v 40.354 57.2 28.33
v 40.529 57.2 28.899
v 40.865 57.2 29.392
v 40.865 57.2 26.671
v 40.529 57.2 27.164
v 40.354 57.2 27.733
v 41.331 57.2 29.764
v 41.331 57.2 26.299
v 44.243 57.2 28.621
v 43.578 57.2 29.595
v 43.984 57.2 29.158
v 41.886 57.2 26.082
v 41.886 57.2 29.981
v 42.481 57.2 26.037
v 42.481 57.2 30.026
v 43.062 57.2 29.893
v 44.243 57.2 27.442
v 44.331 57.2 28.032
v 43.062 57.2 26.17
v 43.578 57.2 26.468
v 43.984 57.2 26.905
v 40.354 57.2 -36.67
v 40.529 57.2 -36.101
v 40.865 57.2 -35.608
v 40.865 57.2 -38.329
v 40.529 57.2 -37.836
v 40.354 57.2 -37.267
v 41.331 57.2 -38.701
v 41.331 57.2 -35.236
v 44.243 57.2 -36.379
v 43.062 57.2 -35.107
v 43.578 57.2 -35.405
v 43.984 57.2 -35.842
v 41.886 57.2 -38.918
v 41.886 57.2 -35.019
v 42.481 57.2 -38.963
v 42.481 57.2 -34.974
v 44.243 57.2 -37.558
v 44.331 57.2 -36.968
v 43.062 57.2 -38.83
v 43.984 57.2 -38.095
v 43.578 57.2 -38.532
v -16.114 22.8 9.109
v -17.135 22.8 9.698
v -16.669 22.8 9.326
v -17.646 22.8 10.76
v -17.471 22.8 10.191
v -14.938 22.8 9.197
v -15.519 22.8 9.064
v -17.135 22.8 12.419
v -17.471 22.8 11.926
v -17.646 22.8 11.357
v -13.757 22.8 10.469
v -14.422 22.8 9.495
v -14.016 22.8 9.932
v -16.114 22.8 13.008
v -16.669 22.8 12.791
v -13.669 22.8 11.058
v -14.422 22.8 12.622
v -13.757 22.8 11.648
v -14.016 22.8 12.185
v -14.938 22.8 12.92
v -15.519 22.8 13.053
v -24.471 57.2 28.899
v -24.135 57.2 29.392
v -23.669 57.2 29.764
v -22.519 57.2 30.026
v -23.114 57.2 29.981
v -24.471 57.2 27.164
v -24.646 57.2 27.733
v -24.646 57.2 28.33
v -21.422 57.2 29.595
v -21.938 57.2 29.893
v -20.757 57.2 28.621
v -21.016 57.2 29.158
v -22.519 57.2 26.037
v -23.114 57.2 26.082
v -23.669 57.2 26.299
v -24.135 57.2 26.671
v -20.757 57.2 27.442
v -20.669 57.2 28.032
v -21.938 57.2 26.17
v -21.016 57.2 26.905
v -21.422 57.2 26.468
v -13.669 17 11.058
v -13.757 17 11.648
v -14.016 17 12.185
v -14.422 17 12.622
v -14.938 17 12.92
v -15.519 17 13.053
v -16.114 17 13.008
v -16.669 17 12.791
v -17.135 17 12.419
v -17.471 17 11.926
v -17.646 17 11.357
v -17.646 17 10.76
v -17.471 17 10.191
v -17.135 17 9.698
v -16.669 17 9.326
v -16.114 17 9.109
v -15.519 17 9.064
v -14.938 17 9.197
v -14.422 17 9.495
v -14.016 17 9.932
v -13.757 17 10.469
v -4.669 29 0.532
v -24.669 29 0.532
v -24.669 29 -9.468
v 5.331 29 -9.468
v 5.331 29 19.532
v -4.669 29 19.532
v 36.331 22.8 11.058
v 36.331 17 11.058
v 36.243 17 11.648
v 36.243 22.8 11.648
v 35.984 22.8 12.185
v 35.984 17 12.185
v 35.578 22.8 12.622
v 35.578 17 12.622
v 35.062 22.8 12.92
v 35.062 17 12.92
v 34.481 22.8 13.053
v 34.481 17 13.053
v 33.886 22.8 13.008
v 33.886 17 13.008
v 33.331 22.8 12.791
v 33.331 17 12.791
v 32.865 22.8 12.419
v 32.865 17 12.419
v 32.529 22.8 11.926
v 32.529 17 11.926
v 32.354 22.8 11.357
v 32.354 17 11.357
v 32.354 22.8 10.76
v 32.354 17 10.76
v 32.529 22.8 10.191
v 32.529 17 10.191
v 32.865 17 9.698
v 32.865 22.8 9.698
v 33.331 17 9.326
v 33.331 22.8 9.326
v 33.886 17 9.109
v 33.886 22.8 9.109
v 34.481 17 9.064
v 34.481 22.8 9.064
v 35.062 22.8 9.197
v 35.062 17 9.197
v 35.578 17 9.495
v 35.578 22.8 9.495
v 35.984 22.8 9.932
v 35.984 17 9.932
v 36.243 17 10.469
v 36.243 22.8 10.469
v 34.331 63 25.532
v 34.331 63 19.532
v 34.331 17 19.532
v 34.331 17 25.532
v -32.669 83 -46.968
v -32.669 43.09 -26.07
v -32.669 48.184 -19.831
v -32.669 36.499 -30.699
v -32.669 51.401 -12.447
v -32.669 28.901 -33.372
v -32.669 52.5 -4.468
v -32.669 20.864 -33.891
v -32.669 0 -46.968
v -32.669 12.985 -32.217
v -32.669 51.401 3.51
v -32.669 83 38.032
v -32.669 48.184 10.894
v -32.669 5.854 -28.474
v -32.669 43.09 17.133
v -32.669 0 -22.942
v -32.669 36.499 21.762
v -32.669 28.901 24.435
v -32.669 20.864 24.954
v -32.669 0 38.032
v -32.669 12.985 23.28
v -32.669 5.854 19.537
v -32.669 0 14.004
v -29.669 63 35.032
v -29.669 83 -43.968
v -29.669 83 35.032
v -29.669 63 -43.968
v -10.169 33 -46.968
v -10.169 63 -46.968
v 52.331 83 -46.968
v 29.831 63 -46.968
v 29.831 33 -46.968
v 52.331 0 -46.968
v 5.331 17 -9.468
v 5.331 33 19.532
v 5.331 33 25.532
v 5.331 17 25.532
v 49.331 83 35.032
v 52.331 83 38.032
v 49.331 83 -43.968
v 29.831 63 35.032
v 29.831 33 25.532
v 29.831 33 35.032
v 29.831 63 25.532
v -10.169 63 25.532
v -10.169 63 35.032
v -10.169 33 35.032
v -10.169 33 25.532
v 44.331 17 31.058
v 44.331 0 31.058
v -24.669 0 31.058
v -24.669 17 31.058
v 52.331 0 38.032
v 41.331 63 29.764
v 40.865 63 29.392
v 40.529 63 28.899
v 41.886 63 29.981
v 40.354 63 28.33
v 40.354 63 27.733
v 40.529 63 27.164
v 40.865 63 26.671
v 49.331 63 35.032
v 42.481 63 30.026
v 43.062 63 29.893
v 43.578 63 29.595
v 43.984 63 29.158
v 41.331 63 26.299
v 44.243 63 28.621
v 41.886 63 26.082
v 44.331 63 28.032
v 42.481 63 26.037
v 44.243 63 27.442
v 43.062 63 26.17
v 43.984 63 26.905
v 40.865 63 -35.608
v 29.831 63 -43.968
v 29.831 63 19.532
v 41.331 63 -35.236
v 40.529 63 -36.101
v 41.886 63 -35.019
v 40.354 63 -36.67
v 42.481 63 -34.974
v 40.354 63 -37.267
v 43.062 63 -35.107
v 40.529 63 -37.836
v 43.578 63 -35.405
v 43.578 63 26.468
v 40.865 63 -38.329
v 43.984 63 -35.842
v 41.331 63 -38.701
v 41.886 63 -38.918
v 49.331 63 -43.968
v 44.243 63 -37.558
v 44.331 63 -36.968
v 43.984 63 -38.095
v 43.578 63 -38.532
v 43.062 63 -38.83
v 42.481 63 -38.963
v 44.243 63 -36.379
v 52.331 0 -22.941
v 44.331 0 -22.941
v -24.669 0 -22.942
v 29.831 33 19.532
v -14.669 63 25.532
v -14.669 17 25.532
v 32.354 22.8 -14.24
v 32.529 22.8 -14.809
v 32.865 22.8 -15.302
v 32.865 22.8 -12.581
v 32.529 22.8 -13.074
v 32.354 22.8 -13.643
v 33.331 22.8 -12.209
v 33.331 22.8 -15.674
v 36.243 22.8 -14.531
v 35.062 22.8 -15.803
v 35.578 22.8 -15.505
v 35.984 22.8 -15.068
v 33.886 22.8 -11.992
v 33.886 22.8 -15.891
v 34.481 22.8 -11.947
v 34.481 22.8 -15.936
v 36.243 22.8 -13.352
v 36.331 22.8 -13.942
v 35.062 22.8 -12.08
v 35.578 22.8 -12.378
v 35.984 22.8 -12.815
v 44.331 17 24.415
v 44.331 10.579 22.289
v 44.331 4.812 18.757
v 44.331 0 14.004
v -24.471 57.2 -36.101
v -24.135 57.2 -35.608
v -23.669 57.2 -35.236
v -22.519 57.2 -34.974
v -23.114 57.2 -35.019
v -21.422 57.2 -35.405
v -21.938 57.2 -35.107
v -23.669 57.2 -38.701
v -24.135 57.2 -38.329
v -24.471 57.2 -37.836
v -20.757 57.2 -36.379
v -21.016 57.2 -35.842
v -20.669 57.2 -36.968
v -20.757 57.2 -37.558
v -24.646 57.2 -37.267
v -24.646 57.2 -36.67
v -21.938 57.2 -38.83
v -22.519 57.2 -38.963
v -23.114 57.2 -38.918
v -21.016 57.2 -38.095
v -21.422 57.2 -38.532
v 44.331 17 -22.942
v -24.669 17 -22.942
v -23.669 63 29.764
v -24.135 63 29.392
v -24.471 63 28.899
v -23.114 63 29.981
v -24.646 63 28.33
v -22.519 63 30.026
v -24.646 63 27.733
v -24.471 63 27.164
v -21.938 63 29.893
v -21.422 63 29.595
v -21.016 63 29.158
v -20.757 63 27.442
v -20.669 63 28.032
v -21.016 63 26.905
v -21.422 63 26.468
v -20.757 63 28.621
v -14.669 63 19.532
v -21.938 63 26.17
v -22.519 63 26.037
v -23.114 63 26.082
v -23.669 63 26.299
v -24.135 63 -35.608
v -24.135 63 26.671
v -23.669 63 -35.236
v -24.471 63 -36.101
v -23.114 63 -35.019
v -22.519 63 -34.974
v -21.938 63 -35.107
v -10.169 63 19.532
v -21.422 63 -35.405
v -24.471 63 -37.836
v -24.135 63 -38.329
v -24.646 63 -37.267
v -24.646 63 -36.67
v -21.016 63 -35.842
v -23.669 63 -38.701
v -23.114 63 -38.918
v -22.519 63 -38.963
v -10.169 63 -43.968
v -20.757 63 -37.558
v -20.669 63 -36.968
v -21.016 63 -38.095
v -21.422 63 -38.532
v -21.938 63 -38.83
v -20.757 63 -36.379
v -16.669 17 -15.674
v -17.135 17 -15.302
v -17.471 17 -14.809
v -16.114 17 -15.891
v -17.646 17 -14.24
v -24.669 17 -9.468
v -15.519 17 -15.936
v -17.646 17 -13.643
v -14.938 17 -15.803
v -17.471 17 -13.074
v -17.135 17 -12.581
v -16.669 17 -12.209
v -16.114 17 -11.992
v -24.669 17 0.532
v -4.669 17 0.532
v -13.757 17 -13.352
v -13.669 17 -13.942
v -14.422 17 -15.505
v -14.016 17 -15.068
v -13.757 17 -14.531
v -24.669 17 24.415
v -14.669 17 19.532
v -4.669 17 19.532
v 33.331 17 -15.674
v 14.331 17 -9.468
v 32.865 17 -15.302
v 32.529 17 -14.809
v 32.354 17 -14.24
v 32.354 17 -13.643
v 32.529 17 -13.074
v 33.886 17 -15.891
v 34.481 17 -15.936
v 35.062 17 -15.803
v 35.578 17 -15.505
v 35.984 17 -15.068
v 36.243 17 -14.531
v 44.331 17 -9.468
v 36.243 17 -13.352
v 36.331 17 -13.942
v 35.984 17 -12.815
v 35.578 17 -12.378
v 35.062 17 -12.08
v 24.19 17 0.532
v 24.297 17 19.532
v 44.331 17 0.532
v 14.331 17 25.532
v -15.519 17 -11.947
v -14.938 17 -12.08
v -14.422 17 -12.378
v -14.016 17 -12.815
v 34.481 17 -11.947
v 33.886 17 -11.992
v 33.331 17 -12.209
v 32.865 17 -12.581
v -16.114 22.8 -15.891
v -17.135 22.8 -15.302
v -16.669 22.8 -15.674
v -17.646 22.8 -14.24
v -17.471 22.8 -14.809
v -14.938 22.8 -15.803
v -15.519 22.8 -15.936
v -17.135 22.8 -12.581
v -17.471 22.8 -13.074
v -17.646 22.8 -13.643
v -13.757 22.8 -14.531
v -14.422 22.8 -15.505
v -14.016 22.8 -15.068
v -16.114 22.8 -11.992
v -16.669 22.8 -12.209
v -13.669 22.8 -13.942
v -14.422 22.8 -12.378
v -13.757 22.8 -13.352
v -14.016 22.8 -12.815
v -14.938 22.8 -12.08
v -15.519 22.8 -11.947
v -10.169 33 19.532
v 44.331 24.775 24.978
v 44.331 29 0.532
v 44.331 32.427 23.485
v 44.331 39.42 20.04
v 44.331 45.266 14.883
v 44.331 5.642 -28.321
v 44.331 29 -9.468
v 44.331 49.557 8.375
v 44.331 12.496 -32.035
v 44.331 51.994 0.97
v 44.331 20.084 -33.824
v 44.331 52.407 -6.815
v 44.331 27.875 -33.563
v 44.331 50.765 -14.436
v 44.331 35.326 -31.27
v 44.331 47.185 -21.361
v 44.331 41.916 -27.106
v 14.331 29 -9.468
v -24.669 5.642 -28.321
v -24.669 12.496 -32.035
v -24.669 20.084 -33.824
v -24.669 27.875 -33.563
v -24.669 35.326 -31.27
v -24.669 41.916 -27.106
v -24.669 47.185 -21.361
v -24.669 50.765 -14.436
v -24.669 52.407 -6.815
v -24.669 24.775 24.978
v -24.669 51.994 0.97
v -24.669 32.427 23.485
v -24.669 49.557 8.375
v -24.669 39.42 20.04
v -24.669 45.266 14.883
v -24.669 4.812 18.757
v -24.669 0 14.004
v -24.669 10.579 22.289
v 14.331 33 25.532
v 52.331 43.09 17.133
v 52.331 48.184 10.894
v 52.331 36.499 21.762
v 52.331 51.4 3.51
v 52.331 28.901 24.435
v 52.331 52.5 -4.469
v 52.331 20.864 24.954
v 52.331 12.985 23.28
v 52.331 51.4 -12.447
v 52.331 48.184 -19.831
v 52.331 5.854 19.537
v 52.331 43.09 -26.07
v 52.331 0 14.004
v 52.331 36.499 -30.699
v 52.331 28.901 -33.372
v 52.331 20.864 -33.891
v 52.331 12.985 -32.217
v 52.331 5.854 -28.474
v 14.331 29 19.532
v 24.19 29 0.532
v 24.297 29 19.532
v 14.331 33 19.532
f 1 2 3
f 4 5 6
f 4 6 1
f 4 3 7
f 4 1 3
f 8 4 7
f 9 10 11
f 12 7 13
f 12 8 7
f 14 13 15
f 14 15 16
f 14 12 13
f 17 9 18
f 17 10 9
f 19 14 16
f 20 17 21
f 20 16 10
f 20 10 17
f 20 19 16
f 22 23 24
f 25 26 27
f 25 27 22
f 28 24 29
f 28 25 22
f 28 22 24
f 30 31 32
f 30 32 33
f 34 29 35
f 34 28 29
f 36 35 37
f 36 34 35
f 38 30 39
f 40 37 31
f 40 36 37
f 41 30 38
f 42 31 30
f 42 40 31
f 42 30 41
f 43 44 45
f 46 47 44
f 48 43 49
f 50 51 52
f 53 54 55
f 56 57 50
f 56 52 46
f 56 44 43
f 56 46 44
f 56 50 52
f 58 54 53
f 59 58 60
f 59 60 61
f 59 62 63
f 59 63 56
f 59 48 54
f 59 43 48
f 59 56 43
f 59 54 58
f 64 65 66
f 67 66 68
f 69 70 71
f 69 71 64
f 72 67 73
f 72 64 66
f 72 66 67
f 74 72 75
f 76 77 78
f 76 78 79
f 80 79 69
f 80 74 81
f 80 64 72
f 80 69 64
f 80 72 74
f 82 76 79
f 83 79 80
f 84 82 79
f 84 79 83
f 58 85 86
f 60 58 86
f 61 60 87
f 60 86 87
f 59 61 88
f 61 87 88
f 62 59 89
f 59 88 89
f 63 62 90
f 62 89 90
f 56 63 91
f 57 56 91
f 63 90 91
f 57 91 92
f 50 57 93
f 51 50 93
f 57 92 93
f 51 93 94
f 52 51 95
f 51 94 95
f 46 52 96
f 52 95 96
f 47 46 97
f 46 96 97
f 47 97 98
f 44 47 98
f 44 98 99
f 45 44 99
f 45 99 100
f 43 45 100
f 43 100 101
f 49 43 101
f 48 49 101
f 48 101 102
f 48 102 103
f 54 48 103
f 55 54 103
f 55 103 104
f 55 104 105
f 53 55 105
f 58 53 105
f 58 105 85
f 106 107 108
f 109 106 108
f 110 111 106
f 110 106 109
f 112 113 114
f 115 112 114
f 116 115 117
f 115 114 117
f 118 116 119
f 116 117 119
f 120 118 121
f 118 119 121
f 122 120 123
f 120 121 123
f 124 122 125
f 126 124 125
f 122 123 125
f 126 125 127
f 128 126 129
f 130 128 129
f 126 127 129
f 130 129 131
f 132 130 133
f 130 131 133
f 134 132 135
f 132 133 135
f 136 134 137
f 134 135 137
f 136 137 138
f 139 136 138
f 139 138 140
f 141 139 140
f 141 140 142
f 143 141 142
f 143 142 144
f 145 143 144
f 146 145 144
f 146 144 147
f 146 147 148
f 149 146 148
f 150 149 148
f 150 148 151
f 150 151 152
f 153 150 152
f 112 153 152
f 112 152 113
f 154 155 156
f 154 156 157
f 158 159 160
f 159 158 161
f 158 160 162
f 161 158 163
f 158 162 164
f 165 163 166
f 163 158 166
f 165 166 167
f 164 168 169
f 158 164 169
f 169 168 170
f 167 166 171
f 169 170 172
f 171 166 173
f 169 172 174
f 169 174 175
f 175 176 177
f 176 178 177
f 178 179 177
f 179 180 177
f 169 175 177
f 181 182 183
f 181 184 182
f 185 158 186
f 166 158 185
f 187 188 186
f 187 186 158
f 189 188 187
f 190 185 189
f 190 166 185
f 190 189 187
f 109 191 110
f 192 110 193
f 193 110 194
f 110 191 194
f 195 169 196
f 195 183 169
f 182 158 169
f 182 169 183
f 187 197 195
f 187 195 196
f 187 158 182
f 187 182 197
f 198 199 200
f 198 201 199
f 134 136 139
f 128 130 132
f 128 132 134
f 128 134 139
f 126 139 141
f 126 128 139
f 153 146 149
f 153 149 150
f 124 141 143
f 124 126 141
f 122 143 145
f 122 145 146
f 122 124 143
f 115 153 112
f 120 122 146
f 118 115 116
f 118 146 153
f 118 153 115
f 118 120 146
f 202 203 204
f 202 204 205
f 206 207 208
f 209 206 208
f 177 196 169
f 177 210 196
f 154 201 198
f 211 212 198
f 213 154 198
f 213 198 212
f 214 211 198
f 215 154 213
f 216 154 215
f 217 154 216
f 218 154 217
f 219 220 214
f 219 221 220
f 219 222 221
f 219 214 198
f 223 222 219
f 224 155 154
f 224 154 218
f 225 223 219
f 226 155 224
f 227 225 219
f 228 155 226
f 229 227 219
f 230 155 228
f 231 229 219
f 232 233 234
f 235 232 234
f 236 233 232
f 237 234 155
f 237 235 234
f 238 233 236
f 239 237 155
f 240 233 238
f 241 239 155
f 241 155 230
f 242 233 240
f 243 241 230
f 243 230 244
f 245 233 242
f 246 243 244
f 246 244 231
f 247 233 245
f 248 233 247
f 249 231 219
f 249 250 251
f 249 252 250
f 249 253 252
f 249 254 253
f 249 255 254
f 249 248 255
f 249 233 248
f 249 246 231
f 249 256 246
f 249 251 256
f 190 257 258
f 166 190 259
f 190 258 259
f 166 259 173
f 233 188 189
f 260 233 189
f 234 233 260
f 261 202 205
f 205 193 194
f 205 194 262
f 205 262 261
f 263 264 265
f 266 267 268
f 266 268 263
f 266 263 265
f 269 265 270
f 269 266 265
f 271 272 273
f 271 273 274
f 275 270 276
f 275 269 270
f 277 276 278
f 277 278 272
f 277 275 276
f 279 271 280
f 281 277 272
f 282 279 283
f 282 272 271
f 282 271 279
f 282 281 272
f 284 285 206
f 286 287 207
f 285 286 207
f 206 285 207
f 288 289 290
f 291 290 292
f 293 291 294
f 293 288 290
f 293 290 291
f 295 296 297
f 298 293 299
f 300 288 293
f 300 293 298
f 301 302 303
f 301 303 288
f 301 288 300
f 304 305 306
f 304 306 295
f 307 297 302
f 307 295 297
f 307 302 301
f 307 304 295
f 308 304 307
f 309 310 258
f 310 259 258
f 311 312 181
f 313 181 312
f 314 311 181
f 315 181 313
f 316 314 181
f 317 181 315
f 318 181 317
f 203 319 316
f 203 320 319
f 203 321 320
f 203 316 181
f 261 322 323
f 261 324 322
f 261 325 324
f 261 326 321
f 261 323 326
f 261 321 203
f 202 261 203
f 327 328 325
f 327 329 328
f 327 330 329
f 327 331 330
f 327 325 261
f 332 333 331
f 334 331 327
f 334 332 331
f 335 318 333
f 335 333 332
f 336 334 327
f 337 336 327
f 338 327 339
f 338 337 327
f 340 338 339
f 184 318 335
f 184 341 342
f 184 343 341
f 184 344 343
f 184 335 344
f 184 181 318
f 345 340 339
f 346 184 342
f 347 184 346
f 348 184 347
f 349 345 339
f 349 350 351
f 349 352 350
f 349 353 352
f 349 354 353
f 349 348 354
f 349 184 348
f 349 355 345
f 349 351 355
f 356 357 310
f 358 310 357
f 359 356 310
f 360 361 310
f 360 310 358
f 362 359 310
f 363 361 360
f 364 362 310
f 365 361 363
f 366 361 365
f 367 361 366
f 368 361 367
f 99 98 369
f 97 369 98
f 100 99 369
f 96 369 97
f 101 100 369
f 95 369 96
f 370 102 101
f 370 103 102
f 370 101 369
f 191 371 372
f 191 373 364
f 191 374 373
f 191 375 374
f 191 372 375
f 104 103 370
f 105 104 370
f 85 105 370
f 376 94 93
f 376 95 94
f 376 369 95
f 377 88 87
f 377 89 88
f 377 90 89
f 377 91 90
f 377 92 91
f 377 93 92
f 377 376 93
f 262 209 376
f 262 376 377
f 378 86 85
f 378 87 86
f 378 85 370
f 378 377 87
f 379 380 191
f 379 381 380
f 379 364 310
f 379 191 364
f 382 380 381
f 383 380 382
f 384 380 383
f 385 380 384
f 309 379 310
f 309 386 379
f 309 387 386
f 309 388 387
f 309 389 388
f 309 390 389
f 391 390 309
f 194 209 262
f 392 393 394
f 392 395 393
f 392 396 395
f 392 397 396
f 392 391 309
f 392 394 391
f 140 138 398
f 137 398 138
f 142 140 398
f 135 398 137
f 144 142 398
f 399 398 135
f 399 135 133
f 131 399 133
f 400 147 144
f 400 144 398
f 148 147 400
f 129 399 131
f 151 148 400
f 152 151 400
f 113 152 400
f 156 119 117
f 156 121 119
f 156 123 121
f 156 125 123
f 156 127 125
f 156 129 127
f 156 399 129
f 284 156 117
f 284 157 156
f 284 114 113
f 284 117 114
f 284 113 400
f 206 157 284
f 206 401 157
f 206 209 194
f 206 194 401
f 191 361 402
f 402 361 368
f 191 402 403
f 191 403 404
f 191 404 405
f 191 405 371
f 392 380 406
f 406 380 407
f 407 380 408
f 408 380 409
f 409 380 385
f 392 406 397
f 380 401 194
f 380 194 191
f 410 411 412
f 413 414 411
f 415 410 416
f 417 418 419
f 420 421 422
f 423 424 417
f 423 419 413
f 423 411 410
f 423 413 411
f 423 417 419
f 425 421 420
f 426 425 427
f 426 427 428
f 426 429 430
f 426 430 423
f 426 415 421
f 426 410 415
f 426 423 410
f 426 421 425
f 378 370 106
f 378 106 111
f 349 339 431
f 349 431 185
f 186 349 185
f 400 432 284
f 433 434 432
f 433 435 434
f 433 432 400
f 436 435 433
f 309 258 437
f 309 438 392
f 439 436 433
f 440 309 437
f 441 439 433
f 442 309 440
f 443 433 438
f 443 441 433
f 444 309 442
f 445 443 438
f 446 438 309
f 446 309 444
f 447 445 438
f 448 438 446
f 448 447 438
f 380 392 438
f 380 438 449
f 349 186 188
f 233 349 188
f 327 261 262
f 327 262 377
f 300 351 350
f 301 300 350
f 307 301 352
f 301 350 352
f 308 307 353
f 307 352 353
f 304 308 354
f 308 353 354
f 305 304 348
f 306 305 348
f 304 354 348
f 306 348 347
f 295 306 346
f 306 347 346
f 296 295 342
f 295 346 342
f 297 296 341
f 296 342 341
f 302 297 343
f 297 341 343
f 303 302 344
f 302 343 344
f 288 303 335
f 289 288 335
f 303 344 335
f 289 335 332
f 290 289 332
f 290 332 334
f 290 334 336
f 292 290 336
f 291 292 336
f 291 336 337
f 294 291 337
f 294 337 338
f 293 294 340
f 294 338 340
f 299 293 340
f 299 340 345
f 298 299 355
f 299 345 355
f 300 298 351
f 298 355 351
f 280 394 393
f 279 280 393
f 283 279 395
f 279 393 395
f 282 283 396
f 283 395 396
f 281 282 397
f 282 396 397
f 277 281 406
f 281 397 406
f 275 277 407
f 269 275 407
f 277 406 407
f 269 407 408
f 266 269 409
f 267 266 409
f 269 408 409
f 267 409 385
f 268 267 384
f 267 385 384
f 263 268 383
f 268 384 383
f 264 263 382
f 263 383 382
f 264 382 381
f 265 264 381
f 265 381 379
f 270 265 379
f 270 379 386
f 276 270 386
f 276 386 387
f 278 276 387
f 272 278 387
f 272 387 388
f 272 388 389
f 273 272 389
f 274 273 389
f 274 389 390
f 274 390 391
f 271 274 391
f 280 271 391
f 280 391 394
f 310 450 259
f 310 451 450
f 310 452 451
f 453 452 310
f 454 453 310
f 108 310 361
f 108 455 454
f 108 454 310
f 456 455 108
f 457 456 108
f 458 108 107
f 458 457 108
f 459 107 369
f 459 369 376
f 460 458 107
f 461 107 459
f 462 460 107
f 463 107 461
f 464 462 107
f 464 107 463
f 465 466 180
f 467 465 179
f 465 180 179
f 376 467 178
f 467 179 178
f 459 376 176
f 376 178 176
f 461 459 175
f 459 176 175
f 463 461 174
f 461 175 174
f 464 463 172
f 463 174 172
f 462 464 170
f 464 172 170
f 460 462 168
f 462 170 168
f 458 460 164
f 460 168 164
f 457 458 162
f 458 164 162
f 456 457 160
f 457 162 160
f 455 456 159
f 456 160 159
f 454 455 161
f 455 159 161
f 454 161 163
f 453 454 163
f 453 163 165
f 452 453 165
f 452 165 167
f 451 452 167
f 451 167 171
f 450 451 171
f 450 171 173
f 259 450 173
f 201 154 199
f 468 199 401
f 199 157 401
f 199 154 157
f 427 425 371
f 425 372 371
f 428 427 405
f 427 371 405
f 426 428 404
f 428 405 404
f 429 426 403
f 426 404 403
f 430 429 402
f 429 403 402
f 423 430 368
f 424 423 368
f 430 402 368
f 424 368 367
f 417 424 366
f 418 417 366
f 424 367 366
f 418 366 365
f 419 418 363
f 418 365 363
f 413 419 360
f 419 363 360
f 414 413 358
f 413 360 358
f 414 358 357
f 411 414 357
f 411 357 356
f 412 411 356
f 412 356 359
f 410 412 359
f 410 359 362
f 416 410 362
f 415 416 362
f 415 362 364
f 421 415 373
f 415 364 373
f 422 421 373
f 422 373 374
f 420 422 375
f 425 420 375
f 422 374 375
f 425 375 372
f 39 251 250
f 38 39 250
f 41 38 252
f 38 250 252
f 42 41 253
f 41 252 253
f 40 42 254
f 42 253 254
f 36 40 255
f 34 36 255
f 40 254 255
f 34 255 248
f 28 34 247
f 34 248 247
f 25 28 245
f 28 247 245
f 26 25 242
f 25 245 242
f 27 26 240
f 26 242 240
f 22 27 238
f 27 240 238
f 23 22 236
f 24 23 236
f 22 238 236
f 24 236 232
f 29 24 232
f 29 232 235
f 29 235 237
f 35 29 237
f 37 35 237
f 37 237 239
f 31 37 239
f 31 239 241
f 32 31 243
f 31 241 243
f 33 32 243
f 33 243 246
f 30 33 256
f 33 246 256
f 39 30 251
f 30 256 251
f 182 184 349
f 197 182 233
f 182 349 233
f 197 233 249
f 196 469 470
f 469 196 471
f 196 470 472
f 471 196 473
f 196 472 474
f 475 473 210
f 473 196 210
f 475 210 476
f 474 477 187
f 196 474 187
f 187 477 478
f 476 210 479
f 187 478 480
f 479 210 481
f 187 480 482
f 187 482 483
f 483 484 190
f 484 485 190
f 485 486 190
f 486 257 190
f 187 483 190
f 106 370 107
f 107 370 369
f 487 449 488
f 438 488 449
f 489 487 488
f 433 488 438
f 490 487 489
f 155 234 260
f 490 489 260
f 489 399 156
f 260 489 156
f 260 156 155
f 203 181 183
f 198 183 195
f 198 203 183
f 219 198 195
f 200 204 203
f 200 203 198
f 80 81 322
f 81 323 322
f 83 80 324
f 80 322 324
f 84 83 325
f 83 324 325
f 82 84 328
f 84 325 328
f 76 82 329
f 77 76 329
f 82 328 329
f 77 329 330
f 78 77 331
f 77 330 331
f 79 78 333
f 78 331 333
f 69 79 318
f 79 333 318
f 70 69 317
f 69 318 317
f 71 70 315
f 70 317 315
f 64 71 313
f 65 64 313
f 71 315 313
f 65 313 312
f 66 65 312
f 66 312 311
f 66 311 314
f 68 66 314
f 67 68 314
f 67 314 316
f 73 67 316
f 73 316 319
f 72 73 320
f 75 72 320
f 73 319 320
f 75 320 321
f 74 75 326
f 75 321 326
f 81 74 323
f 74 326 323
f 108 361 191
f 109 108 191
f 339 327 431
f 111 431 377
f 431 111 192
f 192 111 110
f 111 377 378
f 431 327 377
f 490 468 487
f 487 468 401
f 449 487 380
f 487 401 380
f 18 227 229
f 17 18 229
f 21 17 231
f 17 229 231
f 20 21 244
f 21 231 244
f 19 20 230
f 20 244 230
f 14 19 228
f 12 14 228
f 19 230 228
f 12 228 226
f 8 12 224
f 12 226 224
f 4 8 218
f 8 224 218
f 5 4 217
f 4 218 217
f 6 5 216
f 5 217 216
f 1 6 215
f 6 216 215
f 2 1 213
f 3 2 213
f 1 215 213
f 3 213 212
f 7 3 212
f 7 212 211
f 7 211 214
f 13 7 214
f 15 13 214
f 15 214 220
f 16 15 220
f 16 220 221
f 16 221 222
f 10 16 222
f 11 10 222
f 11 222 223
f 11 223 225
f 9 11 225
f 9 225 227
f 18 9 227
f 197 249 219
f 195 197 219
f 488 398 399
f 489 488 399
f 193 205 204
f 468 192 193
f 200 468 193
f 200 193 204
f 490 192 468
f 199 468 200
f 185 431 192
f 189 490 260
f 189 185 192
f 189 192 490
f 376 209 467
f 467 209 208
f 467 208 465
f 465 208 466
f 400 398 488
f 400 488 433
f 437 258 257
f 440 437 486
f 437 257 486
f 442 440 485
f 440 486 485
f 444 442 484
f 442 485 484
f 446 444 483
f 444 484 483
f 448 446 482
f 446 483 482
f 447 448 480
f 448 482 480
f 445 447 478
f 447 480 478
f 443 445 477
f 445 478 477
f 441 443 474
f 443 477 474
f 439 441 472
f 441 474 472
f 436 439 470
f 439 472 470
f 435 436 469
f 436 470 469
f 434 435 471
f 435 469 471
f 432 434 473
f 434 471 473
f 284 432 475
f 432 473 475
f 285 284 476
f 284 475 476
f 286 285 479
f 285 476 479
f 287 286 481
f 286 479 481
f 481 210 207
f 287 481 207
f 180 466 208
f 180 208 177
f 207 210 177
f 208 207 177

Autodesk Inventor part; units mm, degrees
ref_plane "YZ Plane" through (0, 0, 0) normal (1, 0, 0) x (0, 1, 0)
ref_plane "XZ Plane" through (0, 0, 0) normal (0, 1, 0) x (-1, 0, 0)
ref_plane "XY Plane" through (0, 0, 0) normal (0, 0, 1) x (1, 0, 0)
sketch "Sketch1" plane through (0, 0, 0) normal (0, 1, 0) x (-1, 0, 0)
  line L0 (32.6686, 38.0315) -> (-52.3314, 38.0315)
  line L1 (-52.3314, 38.0315) -> (-52.3314, -46.9685)
  line L2 (-52.3314, -46.9685) -> (32.6686, -46.9685)
  line L3 (32.6686, -46.9685) -> (32.6686, 38.0315)
  point P0 (0, 0)
  dimension "d0" = 85
  dimension "d1" = 85
extrude "Extrusion1" add sketch "Sketch1" along normal blind 73
sketch "Sketch2" plane through (52.3314, 0, 38.0315) normal (1, 0, 0) x (0, 0, -1)
  point P0 (38.0315, 0)
sketch "Sketch3" plane through (52.3314, 0, 38.0315) normal (1, 0, 0) x (0, 0, -1)
  circle A0 centre (42.5, 23) radius 29.5
  line L0 (0, 73) -> (85, 73) projected
  line L1 (85, 0) -> (85, 73) projected
  point P0 (38.0315, 0)
  dimension "d4" = 59
  dimension "d5" = 50
  dimension "d6" = 42.5
extrude "Extrusion2" cut sketch "Sketch3" against normal blind 8
sketch "Sketch4" plane through (-32.6686, 0, -46.9685) normal (-1, 0, 0) x (0, 0, 1)
  arc A0 (60.973, 0) -> (24.027, 0) centre (42.5, 23) ccw projected
  circle A1 centre (42.5, 23) radius 29.5
  point P0 (46.9685, 0)
  point P1 (24.027, 0)
extrude "Extrusion3" cut sketch "Sketch4" against normal blind 8
sketch "Sketch5" plane through (0, 0, 0) normal (0, -1, 0) x (1, 0, 0)
  line L0 (-24.6686, 14.0044) -> (-24.6686, -22.9415) projected
  line L1 (-24.6686, -9.4685) -> (5.3314, -9.4685)
  line L2 (5.3314, -9.4685) -> (5.3314, 0.5315)
  line L3 (-4.6686, 0.5315) -> (-24.6686, 0.5315)
  line L4 (-24.6686, 0.5315) -> (-24.6686, -9.4685)
  line L5 (-4.6686, 0.5315) -> (-4.6686, 25.5315)
  line L6 (-4.6686, 25.5315) -> (5.3314, 25.5315)
  line L7 (5.3314, 25.5315) -> (5.3314, 0.5315)
  line L8 (-24.6686, -9.4685) -> (-24.6686, 0.5315)
  line L9 (44.3314, -9.4685) -> (14.3314, -9.4685)
  line L10 (14.3314, -9.4685) -> (14.3314, 0.5315)
  line L11 (24.1898, 0.5315) -> (44.3314, 0.5315)
  line L12 (24.1898, 0.5315) -> (24.3314, 25.5315)
  line L13 (24.3314, 25.5315) -> (14.3314, 25.5315)
  line L14 (14.3314, 25.5315) -> (14.3314, 0.5315)
  line L15 (44.3314, -9.4685) -> (44.3314, 0.5315)
  line L16 (44.3314, -22.9415) -> (44.3314, 14.0044) projected
  point P0 (0, 0)
  dimension "d13" = 13.473
  dimension "d35" = 10
  dimension "d36" = 9
  dimension "d37" = 10
sketch "Sketch6" plane through (-24.6686, 0, -46.9685) normal (-1, 0, 0) x (0, 0, 1)
  arc A0 (60.973, 0) -> (24.027, 0) centre (42.5, 23) ccw projected
  line L0 (42.5, 23) -> (131.4973, 23)
  point P0 (46.9685, 0)
extrude "Extrusion4" cut sketch "Sketch5" against normal blind 29
sketch "Sketch7" plane through (0, 0, 0) normal (0, -1, 0) x (1, 0, 0)
  line L0 (-24.6686, -22.9415) -> (44.3314, -22.9415)
  line L1 (44.3314, -22.9415) -> (44.3314, 31.0585)
  line L2 (44.3314, 31.0585) -> (-24.6686, 31.0585)
  line L3 (-24.6686, 31.0585) -> (-24.6686, -22.9415)
  point P0 (0, 0)
  dimension "d19" = 69
  dimension "d20" = 54
extrude "Extrusion5" cut sketch "Sketch7" against normal blind 17
sketch "Sketch8" plane through (0, 17, 0) normal (0, -1, 0) x (1, 0, 0)
  circle A0 centre (-15.6686, -13.9415) radius 2
  circle A1 centre (-15.6686, 11.0585) radius 2
  circle A2 centre (34.3314, 11.0585) radius 2
  circle A3 centre (34.3314, -13.9415) radius 2
  line L0 (-26.1879, -23.917) -> (41.8121, -23.917)
  line L1 (-24.6686, 31.0585) -> (44.3314, 31.0585) projected
  line L2 (-24.6686, 31.0585) -> (44.3314, 31.0585)
  line L3 (44.3314, 31.0585) -> (44.3314, -22.9415)
  line L4 (44.3314, -22.9415) -> (-24.6686, -22.9415)
  line L5 (-24.6686, -22.9415) -> (-24.6686, 31.0585)
  point P0 (0, 0)
  point P1 (-18.7833, -12.5016)
  dimension "d23" = 4
  dimension "d24" = 4
  dimension "d25" = 4
  dimension "d26" = 4
  dimension "d27" = 50
  dimension "d28" = 25
  dimension "d31" = 9
  dimension "d32" = 9
extrude "Extrusion6" cut sketch "Sketch8" against normal blind 5.8 contours A0 | A1 | A2 | A3
sketch "Sketch9" plane through (0, 29, 0) normal (0, -1, 0) x (1, 0, 0)
  line L0 (24.1898, 0.5315) -> (24.3314, 25.5315) projected
  line L1 (14.3314, 25.5315) -> (14.3314, -9.4685) projected
  line L2 (24.3314, 25.5315) -> (14.3314, 25.5315)
  line L3 (14.3314, 25.5315) -> (14.3314, 19.5315)
  line L4 (14.3314, 19.5315) -> (24.3314, 19.5315)
  line L5 (24.3314, 19.5315) -> (24.3314, 25.5315)
  line L6 (5.3314, -9.4685) -> (5.3314, 25.5315) projected
  line L7 (5.3314, 25.5315) -> (-14.6686, 25.5315)
  line L8 (-14.6686, 25.5315) -> (-14.6686, 19.5315)
  line L9 (-14.6686, 19.5315) -> (5.3314, 19.5315)
  line L10 (5.3314, 19.5315) -> (5.3314, 25.5315)
  point P0 (0, 0)
  point P1 (24.2974, 19.5315)
  dimension "d39" = 20
  dimension "d40" = 6
  dimension "d47" = 10
extrude "Extrusion7" cut sketch "Sketch9" against normal blind 61.25 contours L4 L1 L2 L0 | L9 L8 L7 L6
sketch "Sketch10" plane through (0, 73, 0) normal (0, 1, 0) x (1, 0, 0)
  line L0 (52.3314, 46.9685) -> (-32.6686, 46.9685) projected
  line L1 (-10.1686, 46.9685) -> (29.8314, 46.9685)
  line L2 (29.8314, 46.9685) -> (29.8314, -35.0315)
  line L3 (29.8314, -35.0315) -> (-10.1686, -35.0315)
  line L4 (-10.1686, -35.0315) -> (-10.1686, 46.9685)
  line L5 (-32.6686, 46.9685) -> (-32.6686, -38.0315) projected
  point P0 (0, 0)
  dimension "d43" = 40
  dimension "d44" = 82
  dimension "d51" = 22.5
sketch "Sketch11" plane through (0, 29, 0) normal (0, -1, 0) x (1, 0, 0)
  line L0 (24.2974, 19.5315) -> (14.3314, 19.5315) projected
  line L1 (14.3314, 19.5315) -> (34.3314, 19.5315)
  line L2 (34.3314, 19.5315) -> (34.3314, 25.5315)
  line L3 (34.3314, 25.5315) -> (14.3314, 25.5315)
  line L4 (14.3314, 25.5315) -> (14.3314, 19.5315)
  point P0 (0, 0)
  dimension "d48" = 20
extrude "Extrusion8" cut sketch "Sketch11" against normal blind 61.25
extrude "Extrusion9" cut sketch "Sketch10" against normal blind 40
sketch "Sketch12" plane through (0, 73, 0) normal (0, 1, 0) x (1, 0, 0)
  line L0 (-56.5689, -78.065) -> (64.3856, -78.065)
  line L1 (64.3856, -78.065) -> (64.3856, 116.3261)
  line L2 (64.3856, 116.3261) -> (-56.5689, 116.3261)
  line L3 (-56.5689, 116.3261) -> (-56.5689, -78.065)
  point P0 (0, 0)
extrude "Extrusion10" cut sketch "Sketch12" against normal blind 10
sketch "Sketch14" plane through (0, 63, 0) normal (0, 1, 0) x (1, 0, 0)
  circle A0 centre (42.3314, -28.0315) radius 2
  circle A1 centre (-22.6686, -28.0315) radius 2
  circle A2 centre (-22.6686, 36.9685) radius 2
  circle A3 centre (42.3314, 36.9685) radius 2
  line L0 (52.3314, 46.9685) -> (52.3314, -38.0315) projected
  line L1 (52.3314, -38.0315) -> (-32.6686, -38.0315) projected
  line L2 (-32.6686, -38.0315) -> (-32.6686, 46.9685) projected
  point P0 (0, 0)
  dimension "d56" = 4
  dimension "d57" = 4
  dimension "d58" = 4
  dimension "d59" = 4
  dimension "d60" = 65
  dimension "d61" = 65
  dimension "d62" = 10
  dimension "d63" = 10
  dimension "d64" = 10
extrude "Extrusion11" cut sketch "Sketch14" against normal blind 5.8
sketch "Sketch15" plane through (0, 63, 0) normal (0, 1, 0) x (1, 0, 0)
  line L0 (-32.6686, 46.9685) -> (-32.6686, 22.9415) projected
  line L1 (-32.6686, 46.9685) -> (-29.6686, 46.9685)
  line L2 (52.3314, 46.9685) -> (-32.6686, 46.9685) projected
  line L3 (-29.6686, 43.9685) -> (-29.6686, -35.0315)
  line L4 (-32.6686, -38.0315) -> (-32.6686, 46.9685) projected
  line L5 (-32.6686, -38.0315) -> (-29.6686, -38.0315)
  line L6 (-29.6686, 46.9685) -> (-32.6686, 46.9685)
  line L7 (-32.6686, 46.9685) -> (-32.6686, -38.0315)
  line L8 (52.3314, 46.9685) -> (52.3314, -38.0315) projected
  line L9 (52.3314, -38.0315) -> (-29.6686, -38.0315)
  line L10 (-29.6686, -35.0315) -> (49.3314, -35.0315)
  line L11 (52.3314, -35.0315) -> (52.3314, -38.0315)
  line L12 (52.3314, 46.9685) -> (49.3314, 46.9685)
  line L13 (49.3314, 43.9685) -> (49.3314, -35.0315)
  line L14 (49.3314, -38.0315) -> (52.3314, -38.0315)
  line L15 (52.3314, -38.0315) -> (52.3314, 46.9685)
  line L16 (49.3314, 46.9685) -> (-29.6686, 46.9685)
  line L17 (-29.6686, 43.9685) -> (49.3314, 43.9685)
  point P0 (0, 0)
  dimension "d67" = 3
  dimension "d69" = 3
  dimension "d70" = 3
extrude "Extrusion12" add sketch "Sketch15" along normal blind 20
sketch "Sketch16" plane through (0, 29, 0) normal (0, 1, 0) x (1, 0, 0)
  line L0 (-14.6686, -25.5315) -> (-14.6686, -19.5315) projected
  line L1 (5.3314, 9.4685) -> (5.3314, -25.5315) projected
  line L2 (-14.6686, -19.5315) -> (5.3314, -19.5315)
  line L3 (5.3314, -19.5315) -> (5.3314, -25.5315)
  line L4 (5.3314, -25.5315) -> (-14.6686, -25.5315)
  line L5 (-14.6686, -25.5315) -> (-14.6686, -19.5315)
  line L6 (24.2974, -19.5315) -> (14.3314, -19.5315) projected
  line L7 (34.3314, -25.5315) -> (24.3314, -25.5315) projected
  line L8 (14.3314, -19.5315) -> (34.3314, -19.5315)
  line L9 (34.3314, -19.5315) -> (34.3314, -25.5315)
  line L10 (34.3314, -25.5315) -> (14.3314, -25.5315)
  line L11 (14.3314, -25.5315) -> (14.3314, -19.5315)
  point P0 (0, 0)
  point P1 (5.3314, -19.5315)
extrude "Extrusion13" cut sketch "Sketch16" against normal through all
sketch "Sketch17" plane through (0, 0, 0) normal (0, -1, 0) x (1, 0, 0)
  point P0 (0, 0)
sketch "Sketch18" plane through (0, 17, 0) normal (0, -1, 0) x (1, 0, 0)
  line L0 (5.3314, 19.5315) -> (5.3314, -9.4685) projected
  line L1 (5.3314, -9.4685) -> (16.5671, -9.4685)
  line L2 (16.5671, -9.4685) -> (16.5671, 0.5747)
  line L3 (16.5671, 0.5747) -> (5.3314, 0.5747)
  line L4 (5.3314, 0.5747) -> (5.3314, -9.4685)
  point P0 (0, 0)
properties part number "RobotBase"
